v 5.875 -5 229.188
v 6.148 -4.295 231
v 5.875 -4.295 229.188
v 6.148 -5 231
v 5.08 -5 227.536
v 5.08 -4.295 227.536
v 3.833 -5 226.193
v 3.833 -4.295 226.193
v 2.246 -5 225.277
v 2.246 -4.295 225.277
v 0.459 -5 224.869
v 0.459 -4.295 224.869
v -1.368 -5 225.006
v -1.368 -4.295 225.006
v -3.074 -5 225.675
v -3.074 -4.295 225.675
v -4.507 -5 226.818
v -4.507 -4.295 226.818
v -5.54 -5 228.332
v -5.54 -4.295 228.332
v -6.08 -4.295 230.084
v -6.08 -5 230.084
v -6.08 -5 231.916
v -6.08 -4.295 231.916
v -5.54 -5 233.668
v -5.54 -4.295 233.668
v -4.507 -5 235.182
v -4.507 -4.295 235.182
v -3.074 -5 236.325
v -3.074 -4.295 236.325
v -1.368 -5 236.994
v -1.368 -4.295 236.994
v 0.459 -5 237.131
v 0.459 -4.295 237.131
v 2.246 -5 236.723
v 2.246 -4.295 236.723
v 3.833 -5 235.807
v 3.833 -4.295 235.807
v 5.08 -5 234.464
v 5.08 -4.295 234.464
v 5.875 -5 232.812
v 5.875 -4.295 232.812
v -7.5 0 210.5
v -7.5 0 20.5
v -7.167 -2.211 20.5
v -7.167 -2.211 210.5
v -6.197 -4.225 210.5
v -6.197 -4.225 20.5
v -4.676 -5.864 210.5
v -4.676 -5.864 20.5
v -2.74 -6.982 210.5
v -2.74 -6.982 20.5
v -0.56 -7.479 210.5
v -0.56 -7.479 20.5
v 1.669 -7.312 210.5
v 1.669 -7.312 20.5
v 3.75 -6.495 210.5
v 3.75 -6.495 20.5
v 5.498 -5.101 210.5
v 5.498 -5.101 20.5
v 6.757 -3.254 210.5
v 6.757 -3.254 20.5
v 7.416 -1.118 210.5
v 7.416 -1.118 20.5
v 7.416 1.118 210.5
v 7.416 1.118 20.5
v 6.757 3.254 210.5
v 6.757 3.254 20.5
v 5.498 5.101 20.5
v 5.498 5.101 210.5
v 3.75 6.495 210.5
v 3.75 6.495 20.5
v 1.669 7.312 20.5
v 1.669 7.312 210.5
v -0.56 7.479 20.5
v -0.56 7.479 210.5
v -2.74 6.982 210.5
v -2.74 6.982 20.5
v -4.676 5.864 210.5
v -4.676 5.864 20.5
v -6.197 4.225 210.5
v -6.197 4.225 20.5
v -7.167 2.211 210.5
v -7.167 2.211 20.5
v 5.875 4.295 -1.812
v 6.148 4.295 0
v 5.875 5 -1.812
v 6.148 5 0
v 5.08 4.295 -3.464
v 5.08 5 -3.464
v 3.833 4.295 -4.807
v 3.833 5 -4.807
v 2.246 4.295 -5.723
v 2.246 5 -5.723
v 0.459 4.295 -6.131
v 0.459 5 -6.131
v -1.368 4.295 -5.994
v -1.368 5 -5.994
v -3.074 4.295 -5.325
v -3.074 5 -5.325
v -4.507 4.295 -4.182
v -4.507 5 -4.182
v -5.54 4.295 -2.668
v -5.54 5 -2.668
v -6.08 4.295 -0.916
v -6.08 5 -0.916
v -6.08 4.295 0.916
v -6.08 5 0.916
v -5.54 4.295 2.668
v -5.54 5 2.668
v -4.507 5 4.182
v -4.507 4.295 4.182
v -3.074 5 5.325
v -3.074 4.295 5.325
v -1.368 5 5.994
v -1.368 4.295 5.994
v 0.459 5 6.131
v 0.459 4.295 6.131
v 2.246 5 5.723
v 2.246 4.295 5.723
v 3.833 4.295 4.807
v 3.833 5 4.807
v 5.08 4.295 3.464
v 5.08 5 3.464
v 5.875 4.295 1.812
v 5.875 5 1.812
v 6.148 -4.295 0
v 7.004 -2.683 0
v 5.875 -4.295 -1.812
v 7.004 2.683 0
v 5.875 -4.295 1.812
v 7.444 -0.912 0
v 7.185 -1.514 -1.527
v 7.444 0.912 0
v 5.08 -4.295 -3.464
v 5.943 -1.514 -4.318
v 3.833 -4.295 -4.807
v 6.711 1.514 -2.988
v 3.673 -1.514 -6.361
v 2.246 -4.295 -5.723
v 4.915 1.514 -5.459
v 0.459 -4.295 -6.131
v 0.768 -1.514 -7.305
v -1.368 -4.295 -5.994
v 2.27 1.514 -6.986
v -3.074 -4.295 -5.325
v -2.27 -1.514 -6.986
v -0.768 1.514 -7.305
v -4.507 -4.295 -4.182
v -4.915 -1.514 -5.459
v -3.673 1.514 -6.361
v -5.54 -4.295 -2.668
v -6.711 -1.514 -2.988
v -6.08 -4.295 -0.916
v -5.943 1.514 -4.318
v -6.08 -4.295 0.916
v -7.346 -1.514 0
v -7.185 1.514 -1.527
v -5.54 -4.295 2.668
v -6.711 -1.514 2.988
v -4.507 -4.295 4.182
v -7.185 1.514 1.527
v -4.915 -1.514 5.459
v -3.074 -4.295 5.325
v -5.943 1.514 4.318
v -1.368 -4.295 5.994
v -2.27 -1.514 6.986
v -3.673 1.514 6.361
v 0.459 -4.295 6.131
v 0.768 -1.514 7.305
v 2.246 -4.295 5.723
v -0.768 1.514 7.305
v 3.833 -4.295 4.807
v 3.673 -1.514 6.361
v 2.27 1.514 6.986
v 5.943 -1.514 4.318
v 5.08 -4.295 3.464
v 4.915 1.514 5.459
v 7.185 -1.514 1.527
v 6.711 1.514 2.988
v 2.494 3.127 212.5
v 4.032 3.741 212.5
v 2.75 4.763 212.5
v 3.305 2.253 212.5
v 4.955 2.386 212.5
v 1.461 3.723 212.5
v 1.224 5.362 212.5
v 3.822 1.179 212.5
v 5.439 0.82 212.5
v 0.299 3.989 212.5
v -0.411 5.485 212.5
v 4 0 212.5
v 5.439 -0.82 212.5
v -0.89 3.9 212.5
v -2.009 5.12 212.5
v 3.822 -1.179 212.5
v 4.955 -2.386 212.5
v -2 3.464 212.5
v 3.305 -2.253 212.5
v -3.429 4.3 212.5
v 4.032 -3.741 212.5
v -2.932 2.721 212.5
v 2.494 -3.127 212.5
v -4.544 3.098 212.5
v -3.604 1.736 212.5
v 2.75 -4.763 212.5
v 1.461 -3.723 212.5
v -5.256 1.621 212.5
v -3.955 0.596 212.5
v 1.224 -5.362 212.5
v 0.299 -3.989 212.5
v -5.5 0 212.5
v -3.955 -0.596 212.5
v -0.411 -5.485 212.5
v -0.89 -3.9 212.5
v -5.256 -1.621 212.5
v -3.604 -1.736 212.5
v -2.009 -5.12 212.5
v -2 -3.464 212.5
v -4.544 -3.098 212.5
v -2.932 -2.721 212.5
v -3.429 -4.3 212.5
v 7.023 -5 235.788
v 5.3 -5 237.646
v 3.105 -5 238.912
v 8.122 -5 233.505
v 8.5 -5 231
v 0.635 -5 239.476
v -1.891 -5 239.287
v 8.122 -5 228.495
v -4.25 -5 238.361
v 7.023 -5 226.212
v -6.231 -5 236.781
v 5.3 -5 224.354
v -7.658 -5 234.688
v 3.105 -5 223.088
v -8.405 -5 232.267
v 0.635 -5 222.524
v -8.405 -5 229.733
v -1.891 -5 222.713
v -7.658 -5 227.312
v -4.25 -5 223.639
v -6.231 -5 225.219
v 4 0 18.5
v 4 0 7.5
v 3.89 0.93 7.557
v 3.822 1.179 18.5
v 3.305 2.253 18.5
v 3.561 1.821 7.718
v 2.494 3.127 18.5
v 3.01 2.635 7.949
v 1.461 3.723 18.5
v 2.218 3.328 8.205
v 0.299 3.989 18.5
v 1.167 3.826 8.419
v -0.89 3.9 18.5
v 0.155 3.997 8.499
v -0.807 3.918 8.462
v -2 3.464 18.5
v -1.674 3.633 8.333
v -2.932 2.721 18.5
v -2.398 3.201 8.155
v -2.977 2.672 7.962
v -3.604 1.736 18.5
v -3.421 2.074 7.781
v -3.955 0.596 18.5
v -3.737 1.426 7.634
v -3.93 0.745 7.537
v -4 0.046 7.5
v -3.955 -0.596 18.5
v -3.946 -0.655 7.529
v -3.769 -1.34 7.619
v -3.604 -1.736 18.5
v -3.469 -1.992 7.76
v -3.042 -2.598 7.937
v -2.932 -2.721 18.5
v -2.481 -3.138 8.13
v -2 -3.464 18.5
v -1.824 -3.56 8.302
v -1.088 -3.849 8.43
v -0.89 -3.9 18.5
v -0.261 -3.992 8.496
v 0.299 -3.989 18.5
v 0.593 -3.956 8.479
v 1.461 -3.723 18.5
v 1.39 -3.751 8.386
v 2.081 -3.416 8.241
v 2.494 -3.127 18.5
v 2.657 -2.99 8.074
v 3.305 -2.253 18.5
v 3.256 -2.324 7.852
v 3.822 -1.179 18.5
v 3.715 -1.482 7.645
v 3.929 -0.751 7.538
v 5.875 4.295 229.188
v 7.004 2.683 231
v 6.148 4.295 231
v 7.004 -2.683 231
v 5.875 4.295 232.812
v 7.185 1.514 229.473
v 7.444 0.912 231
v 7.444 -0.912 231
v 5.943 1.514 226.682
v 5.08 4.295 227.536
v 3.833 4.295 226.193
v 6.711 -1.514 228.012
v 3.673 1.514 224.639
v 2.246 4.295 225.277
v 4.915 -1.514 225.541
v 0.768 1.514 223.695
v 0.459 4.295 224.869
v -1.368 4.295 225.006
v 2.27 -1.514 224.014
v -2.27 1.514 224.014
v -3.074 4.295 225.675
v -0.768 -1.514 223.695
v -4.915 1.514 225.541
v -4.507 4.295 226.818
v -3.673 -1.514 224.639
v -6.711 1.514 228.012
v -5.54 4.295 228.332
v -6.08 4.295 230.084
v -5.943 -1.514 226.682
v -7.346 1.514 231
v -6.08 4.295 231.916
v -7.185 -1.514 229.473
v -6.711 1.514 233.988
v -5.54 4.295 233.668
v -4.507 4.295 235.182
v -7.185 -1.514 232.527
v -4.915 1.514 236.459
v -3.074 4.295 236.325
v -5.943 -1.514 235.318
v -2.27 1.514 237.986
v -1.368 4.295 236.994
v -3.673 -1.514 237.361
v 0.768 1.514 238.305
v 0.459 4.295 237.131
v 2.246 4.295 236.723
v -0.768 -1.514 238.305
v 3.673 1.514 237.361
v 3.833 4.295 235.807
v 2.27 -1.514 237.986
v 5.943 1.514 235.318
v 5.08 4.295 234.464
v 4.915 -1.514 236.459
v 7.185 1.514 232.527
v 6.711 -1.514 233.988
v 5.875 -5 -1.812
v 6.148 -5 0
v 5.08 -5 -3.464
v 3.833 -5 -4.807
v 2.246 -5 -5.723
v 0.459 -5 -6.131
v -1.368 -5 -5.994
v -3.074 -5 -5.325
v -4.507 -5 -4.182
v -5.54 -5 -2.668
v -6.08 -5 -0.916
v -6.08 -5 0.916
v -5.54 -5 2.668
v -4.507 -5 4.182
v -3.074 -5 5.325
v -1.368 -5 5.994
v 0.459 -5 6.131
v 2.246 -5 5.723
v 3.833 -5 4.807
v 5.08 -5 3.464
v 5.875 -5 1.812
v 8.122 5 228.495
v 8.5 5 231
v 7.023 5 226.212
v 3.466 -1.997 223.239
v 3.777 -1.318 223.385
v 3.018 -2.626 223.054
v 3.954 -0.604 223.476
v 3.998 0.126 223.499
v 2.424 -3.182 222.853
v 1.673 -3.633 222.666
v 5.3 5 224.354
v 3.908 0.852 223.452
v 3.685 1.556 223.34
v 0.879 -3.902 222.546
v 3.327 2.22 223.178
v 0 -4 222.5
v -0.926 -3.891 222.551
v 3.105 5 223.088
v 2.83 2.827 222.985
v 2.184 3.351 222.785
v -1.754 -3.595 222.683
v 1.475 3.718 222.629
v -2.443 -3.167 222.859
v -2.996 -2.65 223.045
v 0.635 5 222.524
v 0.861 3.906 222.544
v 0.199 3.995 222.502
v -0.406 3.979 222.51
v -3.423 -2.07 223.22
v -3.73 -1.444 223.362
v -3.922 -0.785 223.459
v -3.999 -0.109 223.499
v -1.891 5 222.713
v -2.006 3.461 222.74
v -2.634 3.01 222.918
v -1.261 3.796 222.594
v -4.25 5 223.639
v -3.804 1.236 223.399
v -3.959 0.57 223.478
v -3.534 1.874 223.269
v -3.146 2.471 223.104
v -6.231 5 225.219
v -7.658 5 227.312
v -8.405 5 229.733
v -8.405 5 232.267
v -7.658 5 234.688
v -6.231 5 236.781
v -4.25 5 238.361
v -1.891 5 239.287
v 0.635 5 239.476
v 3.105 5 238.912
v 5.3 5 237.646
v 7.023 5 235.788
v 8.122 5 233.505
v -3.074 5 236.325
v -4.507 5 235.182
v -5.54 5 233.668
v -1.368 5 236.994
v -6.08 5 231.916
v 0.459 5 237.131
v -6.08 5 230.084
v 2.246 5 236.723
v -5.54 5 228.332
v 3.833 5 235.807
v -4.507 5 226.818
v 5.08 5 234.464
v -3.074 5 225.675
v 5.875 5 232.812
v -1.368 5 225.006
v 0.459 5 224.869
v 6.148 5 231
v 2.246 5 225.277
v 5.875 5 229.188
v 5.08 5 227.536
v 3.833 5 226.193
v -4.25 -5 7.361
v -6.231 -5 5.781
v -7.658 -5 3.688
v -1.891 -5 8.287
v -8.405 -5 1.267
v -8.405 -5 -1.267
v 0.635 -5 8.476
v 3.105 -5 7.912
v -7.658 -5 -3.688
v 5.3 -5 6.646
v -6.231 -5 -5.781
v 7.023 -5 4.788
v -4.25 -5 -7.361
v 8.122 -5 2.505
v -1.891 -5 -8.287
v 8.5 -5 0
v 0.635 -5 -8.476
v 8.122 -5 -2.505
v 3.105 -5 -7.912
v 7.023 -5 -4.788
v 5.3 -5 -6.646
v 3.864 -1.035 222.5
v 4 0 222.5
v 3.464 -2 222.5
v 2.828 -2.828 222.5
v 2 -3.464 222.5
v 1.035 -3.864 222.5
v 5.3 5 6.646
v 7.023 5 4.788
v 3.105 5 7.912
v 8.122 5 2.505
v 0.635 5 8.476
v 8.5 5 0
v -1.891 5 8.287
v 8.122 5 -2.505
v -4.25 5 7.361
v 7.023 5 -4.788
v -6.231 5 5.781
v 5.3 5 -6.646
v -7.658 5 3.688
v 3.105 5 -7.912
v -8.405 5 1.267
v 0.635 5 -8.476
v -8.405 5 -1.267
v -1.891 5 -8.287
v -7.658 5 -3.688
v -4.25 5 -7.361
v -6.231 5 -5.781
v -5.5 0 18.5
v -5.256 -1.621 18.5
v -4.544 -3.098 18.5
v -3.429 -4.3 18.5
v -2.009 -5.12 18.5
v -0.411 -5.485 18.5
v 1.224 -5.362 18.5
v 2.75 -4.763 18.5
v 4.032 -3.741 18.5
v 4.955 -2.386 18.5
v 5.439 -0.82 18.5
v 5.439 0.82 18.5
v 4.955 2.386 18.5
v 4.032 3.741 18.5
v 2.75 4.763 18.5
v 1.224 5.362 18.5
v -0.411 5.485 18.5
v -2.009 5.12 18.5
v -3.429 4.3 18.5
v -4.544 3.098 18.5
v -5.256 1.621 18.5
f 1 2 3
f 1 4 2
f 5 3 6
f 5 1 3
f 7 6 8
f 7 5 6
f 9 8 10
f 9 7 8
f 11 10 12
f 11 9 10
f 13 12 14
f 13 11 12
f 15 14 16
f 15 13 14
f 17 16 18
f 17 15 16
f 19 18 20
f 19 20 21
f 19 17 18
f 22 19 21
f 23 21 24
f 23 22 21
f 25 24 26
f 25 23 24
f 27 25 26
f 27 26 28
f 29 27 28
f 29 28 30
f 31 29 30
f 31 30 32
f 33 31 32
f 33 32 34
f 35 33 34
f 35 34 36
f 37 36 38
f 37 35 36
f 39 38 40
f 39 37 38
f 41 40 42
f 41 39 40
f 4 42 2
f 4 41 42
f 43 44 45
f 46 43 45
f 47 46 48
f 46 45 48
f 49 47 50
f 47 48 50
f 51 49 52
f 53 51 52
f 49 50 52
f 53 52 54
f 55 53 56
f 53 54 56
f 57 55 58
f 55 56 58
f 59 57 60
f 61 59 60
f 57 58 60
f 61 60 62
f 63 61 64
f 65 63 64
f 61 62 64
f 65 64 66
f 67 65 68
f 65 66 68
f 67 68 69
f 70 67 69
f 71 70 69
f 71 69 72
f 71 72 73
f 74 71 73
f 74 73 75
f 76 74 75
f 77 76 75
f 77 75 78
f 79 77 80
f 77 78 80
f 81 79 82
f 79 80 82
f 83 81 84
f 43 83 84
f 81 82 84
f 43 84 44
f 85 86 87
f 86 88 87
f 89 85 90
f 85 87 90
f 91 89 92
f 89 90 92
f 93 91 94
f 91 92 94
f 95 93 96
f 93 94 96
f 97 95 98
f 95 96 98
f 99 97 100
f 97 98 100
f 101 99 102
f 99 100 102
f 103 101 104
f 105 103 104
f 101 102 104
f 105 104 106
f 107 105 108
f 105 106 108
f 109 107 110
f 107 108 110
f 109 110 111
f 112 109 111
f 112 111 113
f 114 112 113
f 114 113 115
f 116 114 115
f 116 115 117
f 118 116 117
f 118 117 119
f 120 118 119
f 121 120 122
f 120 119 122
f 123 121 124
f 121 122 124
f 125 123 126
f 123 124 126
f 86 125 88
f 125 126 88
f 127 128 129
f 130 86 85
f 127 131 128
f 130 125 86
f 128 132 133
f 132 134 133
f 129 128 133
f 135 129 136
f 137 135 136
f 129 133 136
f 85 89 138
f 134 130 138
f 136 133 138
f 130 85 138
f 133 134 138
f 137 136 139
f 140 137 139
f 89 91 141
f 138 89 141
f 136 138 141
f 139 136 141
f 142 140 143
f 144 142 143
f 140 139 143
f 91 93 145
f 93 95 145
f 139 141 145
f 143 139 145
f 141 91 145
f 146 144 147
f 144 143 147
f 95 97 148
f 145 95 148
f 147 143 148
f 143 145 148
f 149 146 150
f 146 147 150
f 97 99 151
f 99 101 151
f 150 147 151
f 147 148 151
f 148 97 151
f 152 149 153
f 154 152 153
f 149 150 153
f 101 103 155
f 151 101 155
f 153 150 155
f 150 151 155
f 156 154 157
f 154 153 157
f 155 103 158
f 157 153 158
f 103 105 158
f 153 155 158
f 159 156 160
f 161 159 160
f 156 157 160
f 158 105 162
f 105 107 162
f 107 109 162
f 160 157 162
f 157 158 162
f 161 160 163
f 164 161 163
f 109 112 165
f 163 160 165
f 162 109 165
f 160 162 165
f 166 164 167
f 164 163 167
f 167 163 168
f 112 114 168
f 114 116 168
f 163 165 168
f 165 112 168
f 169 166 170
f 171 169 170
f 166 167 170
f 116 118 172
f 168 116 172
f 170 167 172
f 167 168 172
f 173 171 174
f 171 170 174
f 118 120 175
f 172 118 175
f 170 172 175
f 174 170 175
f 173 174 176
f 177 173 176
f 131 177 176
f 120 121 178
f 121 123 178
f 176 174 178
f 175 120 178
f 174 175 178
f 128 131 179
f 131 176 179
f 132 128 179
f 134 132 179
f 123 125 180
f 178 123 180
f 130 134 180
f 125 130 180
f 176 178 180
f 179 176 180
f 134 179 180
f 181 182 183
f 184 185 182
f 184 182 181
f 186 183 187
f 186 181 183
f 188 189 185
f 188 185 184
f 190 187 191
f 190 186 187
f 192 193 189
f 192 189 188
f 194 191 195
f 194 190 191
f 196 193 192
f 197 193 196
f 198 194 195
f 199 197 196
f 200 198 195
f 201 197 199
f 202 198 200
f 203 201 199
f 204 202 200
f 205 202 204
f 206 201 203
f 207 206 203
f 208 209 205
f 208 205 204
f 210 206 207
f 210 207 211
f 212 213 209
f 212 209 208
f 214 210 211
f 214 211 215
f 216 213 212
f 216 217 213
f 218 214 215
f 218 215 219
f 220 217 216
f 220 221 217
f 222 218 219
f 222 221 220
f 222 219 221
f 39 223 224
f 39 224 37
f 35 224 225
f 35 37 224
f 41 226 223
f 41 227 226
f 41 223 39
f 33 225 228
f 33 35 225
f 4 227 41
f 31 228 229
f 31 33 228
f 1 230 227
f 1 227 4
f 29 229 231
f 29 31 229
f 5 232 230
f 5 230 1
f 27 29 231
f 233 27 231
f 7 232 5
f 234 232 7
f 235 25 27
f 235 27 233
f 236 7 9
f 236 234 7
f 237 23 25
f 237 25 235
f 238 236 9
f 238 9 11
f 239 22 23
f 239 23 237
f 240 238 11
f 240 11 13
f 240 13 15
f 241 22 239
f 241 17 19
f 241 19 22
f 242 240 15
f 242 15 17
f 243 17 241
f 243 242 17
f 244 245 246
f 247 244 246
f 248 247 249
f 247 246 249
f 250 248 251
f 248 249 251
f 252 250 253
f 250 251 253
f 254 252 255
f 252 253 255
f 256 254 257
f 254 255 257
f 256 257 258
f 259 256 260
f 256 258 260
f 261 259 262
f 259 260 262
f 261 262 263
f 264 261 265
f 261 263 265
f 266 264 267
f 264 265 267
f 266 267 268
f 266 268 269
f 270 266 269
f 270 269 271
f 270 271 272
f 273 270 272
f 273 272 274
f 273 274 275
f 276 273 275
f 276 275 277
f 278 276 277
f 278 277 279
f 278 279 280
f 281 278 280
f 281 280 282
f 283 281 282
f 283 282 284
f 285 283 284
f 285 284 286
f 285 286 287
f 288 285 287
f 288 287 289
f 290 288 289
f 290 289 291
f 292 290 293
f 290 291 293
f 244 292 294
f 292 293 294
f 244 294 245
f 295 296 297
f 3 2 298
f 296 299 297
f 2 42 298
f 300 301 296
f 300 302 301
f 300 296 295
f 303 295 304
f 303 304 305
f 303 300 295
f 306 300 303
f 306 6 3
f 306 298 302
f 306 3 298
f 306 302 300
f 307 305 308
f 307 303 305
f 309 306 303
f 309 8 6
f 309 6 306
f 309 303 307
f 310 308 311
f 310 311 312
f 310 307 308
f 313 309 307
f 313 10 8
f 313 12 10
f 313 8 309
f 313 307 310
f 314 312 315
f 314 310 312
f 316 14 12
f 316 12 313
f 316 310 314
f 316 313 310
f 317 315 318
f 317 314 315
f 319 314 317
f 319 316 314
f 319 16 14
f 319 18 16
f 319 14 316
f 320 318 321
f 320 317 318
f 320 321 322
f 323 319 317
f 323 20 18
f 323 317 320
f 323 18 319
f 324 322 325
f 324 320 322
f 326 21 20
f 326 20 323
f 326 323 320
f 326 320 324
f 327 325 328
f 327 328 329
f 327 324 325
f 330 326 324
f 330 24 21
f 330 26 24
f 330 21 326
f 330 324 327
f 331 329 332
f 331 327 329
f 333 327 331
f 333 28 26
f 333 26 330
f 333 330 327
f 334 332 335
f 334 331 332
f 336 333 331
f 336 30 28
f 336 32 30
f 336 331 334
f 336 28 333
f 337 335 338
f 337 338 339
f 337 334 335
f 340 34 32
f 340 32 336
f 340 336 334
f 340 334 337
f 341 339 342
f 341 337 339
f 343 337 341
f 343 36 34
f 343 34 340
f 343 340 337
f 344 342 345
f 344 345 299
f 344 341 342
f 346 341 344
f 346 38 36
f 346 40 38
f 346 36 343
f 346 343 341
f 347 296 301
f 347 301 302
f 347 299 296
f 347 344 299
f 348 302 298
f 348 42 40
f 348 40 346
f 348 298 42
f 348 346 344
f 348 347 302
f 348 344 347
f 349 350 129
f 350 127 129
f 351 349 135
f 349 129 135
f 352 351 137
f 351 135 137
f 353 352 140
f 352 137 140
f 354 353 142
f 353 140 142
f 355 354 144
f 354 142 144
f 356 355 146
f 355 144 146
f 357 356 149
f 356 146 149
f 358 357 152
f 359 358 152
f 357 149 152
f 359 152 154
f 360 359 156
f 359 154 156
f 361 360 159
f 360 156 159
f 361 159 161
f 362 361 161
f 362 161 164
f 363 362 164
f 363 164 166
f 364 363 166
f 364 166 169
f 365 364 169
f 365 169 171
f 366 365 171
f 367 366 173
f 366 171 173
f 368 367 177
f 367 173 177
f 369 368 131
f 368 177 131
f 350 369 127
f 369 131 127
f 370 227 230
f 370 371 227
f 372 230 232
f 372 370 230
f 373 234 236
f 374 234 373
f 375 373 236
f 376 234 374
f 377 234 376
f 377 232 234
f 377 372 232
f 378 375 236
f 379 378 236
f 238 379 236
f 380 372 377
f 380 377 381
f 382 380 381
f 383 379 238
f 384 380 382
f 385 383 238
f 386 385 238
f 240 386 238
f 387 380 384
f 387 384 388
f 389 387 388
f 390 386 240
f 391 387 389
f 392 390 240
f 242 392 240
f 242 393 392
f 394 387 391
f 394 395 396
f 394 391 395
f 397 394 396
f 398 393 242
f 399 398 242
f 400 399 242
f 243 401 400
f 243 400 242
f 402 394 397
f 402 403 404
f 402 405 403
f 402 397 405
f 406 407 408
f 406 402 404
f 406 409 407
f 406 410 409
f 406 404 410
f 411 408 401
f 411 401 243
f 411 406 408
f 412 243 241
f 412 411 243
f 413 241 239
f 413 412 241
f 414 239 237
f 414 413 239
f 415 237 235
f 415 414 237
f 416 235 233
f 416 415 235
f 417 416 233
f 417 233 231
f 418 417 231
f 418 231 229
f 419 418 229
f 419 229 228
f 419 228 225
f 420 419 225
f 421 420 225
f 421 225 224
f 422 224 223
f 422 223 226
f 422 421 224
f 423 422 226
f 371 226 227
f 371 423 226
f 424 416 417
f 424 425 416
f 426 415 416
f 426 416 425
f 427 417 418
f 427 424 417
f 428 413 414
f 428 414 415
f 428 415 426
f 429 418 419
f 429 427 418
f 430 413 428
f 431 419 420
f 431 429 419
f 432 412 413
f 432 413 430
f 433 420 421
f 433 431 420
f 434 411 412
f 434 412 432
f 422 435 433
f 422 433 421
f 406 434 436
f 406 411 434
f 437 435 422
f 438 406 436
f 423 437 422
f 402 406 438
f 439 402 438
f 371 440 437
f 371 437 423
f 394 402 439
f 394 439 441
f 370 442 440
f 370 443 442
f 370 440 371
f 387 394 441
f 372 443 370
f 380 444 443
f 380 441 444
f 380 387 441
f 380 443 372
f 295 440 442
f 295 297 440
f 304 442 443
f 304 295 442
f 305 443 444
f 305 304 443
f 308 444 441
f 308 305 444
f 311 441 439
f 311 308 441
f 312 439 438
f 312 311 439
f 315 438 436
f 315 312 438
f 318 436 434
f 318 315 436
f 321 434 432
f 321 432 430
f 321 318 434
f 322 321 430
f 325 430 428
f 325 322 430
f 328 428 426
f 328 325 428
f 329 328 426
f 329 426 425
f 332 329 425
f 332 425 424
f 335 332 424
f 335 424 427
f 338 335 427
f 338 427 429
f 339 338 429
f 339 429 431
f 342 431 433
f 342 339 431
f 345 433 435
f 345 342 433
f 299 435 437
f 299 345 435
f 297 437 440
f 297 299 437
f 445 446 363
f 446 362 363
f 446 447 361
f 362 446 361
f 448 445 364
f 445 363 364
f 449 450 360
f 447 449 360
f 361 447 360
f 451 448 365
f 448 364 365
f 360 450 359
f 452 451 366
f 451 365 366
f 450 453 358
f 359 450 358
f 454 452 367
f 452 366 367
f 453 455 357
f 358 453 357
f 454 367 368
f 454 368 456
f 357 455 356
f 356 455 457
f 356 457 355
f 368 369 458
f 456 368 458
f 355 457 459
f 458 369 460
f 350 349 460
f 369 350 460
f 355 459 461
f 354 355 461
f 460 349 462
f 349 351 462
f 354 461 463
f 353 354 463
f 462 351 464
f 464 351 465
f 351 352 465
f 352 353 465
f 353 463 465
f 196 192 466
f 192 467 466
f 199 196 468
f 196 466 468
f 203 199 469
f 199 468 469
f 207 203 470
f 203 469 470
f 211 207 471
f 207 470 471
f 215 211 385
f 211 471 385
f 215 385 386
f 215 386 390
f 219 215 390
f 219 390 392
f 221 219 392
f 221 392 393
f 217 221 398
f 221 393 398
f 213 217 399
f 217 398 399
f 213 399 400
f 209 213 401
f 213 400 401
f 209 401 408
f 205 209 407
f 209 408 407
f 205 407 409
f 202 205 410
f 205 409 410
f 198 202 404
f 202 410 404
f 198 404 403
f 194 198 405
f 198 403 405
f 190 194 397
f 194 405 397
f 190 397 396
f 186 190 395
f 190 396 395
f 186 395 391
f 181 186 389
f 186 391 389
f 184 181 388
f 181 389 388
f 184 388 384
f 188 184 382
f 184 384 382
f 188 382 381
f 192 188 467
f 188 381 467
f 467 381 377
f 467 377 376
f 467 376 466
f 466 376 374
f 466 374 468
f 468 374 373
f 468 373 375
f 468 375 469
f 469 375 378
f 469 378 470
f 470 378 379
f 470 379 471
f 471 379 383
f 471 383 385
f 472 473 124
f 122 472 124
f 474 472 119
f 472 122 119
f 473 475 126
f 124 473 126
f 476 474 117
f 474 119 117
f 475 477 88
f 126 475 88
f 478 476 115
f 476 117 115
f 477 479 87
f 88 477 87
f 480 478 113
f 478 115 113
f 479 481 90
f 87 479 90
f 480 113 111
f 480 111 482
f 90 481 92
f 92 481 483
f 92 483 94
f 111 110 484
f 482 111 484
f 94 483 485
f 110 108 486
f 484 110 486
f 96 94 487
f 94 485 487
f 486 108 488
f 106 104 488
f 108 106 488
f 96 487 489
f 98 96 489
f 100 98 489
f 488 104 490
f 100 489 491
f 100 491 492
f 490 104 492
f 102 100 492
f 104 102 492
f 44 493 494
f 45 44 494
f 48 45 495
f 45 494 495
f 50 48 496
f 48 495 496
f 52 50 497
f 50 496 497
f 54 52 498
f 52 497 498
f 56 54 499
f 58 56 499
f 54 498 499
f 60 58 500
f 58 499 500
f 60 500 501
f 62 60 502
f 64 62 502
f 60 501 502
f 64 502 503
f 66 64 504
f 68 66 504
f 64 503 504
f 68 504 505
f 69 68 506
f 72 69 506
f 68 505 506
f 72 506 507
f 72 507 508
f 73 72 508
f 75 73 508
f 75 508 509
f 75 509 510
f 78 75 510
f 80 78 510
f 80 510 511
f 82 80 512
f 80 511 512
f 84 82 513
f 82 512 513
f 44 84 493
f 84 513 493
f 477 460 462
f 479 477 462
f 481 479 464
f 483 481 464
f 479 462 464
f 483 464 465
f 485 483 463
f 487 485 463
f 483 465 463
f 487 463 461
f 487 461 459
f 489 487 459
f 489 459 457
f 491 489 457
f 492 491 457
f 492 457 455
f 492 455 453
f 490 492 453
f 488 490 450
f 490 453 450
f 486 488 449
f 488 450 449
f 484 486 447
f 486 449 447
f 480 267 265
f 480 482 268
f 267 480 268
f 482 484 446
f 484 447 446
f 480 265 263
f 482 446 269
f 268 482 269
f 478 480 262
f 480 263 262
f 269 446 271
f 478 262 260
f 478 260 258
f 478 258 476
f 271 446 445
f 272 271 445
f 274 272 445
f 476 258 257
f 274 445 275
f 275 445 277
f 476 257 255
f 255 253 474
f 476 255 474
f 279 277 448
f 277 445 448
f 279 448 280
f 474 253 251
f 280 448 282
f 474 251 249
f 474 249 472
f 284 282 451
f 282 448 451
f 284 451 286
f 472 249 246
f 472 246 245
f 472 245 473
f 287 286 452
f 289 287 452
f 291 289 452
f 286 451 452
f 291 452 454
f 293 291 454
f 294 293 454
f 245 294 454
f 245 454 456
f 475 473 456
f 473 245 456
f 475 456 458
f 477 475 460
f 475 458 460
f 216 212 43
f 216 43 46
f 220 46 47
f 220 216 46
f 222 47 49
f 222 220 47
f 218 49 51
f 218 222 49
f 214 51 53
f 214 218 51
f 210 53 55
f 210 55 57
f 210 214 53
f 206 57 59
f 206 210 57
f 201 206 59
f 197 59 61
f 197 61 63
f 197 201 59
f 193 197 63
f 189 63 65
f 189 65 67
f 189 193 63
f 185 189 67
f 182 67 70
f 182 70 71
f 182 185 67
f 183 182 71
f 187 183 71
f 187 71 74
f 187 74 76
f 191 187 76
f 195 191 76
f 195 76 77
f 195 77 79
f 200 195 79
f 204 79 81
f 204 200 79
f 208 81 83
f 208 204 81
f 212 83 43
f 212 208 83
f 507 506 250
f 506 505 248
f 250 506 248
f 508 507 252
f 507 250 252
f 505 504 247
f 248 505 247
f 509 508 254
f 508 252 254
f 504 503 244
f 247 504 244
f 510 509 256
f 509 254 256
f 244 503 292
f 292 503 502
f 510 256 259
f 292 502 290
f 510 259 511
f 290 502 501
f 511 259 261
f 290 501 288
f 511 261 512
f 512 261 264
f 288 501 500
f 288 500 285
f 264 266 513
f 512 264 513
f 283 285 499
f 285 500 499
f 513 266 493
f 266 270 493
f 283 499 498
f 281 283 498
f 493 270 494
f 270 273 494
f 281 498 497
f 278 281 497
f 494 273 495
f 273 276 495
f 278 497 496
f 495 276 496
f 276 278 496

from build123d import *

# Parameters (mm, degrees)
BOSS_EXTRUDE1_START             = -1
SKETCH2_R                       = 4
BOSS_EXTRUDE1_DEPTH             = 11
SKETCH3_R                       = 7.5
BOSS_EXTRUDE2_DEPTH             = 194
CHAMFER1_SIZE                   = 2
CHAMFER2_SIZE                   = 2
BOSS_EXTRUDE3_REACH             = 233.278
BOSS_EXTRUDE3_END_RADIUS        = 8.5
SKETCH5_R                       = 4
BOSS_EXTRUDE3_DIRECTION_2_DEPTH = 10


with BuildPart() as part:
    # Sketch1 → Revolve2 (revolve)
    with BuildSketch(Plane.XY):
        with BuildLine():
            Line((6.148407421, 4.295007123), (6.148407421, 5))
            Line((6.148407421, 5), (8.5, 5))
            Line((8.5, 5), (8.5, -5))
            Line((8.5, -5), (6.148407421, -5))
            Line((6.148407421, -5), (6.148407421, -4.295007123))
            ThreePointArc((6.148407421, -4.295007123), (7.5, 0), (6.148407421, 4.295007123))
        make_face()
    revolve(axis=Axis((0, -1000, 0), (0, 1, 0)))

    # Sketch2 → Boss-Extrude1 (add)
    with BuildSketch(Plane.XY.offset(8.5).offset(BOSS_EXTRUDE1_START)):
        Circle(SKETCH2_R)
    extrude(amount=BOSS_EXTRUDE1_DEPTH)

    # Sketch3 → Boss-Extrude2 (add)
    with BuildSketch(Plane.XY.offset(18.5)):
        with Locations(Location((0, 0, 0), (0, 0, 180))):
            Circle(SKETCH3_R)
    extrude(amount=BOSS_EXTRUDE2_DEPTH)

    # Chamfer1
    chamfer1_edges = [part.edges().sort_by_distance(p)[0] for p in [
        (7.5, 0, 18.5),
    ]]
    chamfer(chamfer1_edges, length=CHAMFER1_SIZE)

    # Chamfer2
    chamfer2_edges = [part.edges().sort_by_distance(p)[0] for p in [
        (7.5, 0, 212.5),
    ]]
    chamfer(chamfer2_edges, length=CHAMFER2_SIZE)



with BuildPart() as body_2:
    # Sketch4 → Revolve3 (revolve)
    with BuildSketch(Plane.XY.offset(231)):
        with BuildLine():
            Line((6.148407421, 5), (6.148407421, 4.295007123))
            ThreePointArc((6.148407421, 4.295007123), (7.5, 0), (6.148407421, -4.295007123))
            Line((6.148407421, -4.295007123), (6.148407421, -5))
            Line((6.148407421, -5), (8.5, -5))
            Line((8.5, -5), (8.5, 5))
            Line((8.5, 5), (6.148407421, 5))
        make_face()
    revolve(axis=Axis((0, -1000, 231), (0, 1, 0)))


with BuildPart() as part_1:
    add(part.part)

    add(body_2.part)  # Boss-Extrude3 merges body 2
    # Boss-Extrude3: up to this cylinder (the profile starts outside it)
    boss_extrude3_end = Plane(origin=(0, 0, 231), z_dir=(0, -1, 0)) * Cylinder(BOSS_EXTRUDE3_END_RADIUS, 484.556, mode=Mode.PRIVATE)
    # Sketch5 → Boss-Extrude3 (add, up to the surface)
    with BuildSketch(Plane(origin=(0, 0, 222.5), x_dir=(-1, 0, 0), z_dir=(0, 0, -1)), mode=Mode.PRIVATE) as boss_extrude3_sk1:
        with Locations(Location((0, 0, 0), (0, 0, 180))):
            Circle(SKETCH5_R)
    boss_extrude3_tool1 = extrude(boss_extrude3_sk1.sketch, amount=-BOSS_EXTRUDE3_REACH, mode=Mode.PRIVATE) - boss_extrude3_end
    add(boss_extrude3_tool1.solids().sort_by_distance((0, 0, 222.5))[0])
    add(boss_extrude3_tool1.solids().sort_by_distance((0, 0, 222.5))[1])

    # Sketch5 → Boss-Extrude3 direction 2 (add)
    with BuildSketch(Plane(origin=(0, 0, 222.5), x_dir=(-1, 0, 0), z_dir=(0, 0, -1))):
        with Locations(Location((0, 0, 0), (0, 0, 180))):
            Circle(SKETCH5_R)
    extrude(amount=BOSS_EXTRUDE3_DIRECTION_2_DEPTH)


solid = part_1.part
